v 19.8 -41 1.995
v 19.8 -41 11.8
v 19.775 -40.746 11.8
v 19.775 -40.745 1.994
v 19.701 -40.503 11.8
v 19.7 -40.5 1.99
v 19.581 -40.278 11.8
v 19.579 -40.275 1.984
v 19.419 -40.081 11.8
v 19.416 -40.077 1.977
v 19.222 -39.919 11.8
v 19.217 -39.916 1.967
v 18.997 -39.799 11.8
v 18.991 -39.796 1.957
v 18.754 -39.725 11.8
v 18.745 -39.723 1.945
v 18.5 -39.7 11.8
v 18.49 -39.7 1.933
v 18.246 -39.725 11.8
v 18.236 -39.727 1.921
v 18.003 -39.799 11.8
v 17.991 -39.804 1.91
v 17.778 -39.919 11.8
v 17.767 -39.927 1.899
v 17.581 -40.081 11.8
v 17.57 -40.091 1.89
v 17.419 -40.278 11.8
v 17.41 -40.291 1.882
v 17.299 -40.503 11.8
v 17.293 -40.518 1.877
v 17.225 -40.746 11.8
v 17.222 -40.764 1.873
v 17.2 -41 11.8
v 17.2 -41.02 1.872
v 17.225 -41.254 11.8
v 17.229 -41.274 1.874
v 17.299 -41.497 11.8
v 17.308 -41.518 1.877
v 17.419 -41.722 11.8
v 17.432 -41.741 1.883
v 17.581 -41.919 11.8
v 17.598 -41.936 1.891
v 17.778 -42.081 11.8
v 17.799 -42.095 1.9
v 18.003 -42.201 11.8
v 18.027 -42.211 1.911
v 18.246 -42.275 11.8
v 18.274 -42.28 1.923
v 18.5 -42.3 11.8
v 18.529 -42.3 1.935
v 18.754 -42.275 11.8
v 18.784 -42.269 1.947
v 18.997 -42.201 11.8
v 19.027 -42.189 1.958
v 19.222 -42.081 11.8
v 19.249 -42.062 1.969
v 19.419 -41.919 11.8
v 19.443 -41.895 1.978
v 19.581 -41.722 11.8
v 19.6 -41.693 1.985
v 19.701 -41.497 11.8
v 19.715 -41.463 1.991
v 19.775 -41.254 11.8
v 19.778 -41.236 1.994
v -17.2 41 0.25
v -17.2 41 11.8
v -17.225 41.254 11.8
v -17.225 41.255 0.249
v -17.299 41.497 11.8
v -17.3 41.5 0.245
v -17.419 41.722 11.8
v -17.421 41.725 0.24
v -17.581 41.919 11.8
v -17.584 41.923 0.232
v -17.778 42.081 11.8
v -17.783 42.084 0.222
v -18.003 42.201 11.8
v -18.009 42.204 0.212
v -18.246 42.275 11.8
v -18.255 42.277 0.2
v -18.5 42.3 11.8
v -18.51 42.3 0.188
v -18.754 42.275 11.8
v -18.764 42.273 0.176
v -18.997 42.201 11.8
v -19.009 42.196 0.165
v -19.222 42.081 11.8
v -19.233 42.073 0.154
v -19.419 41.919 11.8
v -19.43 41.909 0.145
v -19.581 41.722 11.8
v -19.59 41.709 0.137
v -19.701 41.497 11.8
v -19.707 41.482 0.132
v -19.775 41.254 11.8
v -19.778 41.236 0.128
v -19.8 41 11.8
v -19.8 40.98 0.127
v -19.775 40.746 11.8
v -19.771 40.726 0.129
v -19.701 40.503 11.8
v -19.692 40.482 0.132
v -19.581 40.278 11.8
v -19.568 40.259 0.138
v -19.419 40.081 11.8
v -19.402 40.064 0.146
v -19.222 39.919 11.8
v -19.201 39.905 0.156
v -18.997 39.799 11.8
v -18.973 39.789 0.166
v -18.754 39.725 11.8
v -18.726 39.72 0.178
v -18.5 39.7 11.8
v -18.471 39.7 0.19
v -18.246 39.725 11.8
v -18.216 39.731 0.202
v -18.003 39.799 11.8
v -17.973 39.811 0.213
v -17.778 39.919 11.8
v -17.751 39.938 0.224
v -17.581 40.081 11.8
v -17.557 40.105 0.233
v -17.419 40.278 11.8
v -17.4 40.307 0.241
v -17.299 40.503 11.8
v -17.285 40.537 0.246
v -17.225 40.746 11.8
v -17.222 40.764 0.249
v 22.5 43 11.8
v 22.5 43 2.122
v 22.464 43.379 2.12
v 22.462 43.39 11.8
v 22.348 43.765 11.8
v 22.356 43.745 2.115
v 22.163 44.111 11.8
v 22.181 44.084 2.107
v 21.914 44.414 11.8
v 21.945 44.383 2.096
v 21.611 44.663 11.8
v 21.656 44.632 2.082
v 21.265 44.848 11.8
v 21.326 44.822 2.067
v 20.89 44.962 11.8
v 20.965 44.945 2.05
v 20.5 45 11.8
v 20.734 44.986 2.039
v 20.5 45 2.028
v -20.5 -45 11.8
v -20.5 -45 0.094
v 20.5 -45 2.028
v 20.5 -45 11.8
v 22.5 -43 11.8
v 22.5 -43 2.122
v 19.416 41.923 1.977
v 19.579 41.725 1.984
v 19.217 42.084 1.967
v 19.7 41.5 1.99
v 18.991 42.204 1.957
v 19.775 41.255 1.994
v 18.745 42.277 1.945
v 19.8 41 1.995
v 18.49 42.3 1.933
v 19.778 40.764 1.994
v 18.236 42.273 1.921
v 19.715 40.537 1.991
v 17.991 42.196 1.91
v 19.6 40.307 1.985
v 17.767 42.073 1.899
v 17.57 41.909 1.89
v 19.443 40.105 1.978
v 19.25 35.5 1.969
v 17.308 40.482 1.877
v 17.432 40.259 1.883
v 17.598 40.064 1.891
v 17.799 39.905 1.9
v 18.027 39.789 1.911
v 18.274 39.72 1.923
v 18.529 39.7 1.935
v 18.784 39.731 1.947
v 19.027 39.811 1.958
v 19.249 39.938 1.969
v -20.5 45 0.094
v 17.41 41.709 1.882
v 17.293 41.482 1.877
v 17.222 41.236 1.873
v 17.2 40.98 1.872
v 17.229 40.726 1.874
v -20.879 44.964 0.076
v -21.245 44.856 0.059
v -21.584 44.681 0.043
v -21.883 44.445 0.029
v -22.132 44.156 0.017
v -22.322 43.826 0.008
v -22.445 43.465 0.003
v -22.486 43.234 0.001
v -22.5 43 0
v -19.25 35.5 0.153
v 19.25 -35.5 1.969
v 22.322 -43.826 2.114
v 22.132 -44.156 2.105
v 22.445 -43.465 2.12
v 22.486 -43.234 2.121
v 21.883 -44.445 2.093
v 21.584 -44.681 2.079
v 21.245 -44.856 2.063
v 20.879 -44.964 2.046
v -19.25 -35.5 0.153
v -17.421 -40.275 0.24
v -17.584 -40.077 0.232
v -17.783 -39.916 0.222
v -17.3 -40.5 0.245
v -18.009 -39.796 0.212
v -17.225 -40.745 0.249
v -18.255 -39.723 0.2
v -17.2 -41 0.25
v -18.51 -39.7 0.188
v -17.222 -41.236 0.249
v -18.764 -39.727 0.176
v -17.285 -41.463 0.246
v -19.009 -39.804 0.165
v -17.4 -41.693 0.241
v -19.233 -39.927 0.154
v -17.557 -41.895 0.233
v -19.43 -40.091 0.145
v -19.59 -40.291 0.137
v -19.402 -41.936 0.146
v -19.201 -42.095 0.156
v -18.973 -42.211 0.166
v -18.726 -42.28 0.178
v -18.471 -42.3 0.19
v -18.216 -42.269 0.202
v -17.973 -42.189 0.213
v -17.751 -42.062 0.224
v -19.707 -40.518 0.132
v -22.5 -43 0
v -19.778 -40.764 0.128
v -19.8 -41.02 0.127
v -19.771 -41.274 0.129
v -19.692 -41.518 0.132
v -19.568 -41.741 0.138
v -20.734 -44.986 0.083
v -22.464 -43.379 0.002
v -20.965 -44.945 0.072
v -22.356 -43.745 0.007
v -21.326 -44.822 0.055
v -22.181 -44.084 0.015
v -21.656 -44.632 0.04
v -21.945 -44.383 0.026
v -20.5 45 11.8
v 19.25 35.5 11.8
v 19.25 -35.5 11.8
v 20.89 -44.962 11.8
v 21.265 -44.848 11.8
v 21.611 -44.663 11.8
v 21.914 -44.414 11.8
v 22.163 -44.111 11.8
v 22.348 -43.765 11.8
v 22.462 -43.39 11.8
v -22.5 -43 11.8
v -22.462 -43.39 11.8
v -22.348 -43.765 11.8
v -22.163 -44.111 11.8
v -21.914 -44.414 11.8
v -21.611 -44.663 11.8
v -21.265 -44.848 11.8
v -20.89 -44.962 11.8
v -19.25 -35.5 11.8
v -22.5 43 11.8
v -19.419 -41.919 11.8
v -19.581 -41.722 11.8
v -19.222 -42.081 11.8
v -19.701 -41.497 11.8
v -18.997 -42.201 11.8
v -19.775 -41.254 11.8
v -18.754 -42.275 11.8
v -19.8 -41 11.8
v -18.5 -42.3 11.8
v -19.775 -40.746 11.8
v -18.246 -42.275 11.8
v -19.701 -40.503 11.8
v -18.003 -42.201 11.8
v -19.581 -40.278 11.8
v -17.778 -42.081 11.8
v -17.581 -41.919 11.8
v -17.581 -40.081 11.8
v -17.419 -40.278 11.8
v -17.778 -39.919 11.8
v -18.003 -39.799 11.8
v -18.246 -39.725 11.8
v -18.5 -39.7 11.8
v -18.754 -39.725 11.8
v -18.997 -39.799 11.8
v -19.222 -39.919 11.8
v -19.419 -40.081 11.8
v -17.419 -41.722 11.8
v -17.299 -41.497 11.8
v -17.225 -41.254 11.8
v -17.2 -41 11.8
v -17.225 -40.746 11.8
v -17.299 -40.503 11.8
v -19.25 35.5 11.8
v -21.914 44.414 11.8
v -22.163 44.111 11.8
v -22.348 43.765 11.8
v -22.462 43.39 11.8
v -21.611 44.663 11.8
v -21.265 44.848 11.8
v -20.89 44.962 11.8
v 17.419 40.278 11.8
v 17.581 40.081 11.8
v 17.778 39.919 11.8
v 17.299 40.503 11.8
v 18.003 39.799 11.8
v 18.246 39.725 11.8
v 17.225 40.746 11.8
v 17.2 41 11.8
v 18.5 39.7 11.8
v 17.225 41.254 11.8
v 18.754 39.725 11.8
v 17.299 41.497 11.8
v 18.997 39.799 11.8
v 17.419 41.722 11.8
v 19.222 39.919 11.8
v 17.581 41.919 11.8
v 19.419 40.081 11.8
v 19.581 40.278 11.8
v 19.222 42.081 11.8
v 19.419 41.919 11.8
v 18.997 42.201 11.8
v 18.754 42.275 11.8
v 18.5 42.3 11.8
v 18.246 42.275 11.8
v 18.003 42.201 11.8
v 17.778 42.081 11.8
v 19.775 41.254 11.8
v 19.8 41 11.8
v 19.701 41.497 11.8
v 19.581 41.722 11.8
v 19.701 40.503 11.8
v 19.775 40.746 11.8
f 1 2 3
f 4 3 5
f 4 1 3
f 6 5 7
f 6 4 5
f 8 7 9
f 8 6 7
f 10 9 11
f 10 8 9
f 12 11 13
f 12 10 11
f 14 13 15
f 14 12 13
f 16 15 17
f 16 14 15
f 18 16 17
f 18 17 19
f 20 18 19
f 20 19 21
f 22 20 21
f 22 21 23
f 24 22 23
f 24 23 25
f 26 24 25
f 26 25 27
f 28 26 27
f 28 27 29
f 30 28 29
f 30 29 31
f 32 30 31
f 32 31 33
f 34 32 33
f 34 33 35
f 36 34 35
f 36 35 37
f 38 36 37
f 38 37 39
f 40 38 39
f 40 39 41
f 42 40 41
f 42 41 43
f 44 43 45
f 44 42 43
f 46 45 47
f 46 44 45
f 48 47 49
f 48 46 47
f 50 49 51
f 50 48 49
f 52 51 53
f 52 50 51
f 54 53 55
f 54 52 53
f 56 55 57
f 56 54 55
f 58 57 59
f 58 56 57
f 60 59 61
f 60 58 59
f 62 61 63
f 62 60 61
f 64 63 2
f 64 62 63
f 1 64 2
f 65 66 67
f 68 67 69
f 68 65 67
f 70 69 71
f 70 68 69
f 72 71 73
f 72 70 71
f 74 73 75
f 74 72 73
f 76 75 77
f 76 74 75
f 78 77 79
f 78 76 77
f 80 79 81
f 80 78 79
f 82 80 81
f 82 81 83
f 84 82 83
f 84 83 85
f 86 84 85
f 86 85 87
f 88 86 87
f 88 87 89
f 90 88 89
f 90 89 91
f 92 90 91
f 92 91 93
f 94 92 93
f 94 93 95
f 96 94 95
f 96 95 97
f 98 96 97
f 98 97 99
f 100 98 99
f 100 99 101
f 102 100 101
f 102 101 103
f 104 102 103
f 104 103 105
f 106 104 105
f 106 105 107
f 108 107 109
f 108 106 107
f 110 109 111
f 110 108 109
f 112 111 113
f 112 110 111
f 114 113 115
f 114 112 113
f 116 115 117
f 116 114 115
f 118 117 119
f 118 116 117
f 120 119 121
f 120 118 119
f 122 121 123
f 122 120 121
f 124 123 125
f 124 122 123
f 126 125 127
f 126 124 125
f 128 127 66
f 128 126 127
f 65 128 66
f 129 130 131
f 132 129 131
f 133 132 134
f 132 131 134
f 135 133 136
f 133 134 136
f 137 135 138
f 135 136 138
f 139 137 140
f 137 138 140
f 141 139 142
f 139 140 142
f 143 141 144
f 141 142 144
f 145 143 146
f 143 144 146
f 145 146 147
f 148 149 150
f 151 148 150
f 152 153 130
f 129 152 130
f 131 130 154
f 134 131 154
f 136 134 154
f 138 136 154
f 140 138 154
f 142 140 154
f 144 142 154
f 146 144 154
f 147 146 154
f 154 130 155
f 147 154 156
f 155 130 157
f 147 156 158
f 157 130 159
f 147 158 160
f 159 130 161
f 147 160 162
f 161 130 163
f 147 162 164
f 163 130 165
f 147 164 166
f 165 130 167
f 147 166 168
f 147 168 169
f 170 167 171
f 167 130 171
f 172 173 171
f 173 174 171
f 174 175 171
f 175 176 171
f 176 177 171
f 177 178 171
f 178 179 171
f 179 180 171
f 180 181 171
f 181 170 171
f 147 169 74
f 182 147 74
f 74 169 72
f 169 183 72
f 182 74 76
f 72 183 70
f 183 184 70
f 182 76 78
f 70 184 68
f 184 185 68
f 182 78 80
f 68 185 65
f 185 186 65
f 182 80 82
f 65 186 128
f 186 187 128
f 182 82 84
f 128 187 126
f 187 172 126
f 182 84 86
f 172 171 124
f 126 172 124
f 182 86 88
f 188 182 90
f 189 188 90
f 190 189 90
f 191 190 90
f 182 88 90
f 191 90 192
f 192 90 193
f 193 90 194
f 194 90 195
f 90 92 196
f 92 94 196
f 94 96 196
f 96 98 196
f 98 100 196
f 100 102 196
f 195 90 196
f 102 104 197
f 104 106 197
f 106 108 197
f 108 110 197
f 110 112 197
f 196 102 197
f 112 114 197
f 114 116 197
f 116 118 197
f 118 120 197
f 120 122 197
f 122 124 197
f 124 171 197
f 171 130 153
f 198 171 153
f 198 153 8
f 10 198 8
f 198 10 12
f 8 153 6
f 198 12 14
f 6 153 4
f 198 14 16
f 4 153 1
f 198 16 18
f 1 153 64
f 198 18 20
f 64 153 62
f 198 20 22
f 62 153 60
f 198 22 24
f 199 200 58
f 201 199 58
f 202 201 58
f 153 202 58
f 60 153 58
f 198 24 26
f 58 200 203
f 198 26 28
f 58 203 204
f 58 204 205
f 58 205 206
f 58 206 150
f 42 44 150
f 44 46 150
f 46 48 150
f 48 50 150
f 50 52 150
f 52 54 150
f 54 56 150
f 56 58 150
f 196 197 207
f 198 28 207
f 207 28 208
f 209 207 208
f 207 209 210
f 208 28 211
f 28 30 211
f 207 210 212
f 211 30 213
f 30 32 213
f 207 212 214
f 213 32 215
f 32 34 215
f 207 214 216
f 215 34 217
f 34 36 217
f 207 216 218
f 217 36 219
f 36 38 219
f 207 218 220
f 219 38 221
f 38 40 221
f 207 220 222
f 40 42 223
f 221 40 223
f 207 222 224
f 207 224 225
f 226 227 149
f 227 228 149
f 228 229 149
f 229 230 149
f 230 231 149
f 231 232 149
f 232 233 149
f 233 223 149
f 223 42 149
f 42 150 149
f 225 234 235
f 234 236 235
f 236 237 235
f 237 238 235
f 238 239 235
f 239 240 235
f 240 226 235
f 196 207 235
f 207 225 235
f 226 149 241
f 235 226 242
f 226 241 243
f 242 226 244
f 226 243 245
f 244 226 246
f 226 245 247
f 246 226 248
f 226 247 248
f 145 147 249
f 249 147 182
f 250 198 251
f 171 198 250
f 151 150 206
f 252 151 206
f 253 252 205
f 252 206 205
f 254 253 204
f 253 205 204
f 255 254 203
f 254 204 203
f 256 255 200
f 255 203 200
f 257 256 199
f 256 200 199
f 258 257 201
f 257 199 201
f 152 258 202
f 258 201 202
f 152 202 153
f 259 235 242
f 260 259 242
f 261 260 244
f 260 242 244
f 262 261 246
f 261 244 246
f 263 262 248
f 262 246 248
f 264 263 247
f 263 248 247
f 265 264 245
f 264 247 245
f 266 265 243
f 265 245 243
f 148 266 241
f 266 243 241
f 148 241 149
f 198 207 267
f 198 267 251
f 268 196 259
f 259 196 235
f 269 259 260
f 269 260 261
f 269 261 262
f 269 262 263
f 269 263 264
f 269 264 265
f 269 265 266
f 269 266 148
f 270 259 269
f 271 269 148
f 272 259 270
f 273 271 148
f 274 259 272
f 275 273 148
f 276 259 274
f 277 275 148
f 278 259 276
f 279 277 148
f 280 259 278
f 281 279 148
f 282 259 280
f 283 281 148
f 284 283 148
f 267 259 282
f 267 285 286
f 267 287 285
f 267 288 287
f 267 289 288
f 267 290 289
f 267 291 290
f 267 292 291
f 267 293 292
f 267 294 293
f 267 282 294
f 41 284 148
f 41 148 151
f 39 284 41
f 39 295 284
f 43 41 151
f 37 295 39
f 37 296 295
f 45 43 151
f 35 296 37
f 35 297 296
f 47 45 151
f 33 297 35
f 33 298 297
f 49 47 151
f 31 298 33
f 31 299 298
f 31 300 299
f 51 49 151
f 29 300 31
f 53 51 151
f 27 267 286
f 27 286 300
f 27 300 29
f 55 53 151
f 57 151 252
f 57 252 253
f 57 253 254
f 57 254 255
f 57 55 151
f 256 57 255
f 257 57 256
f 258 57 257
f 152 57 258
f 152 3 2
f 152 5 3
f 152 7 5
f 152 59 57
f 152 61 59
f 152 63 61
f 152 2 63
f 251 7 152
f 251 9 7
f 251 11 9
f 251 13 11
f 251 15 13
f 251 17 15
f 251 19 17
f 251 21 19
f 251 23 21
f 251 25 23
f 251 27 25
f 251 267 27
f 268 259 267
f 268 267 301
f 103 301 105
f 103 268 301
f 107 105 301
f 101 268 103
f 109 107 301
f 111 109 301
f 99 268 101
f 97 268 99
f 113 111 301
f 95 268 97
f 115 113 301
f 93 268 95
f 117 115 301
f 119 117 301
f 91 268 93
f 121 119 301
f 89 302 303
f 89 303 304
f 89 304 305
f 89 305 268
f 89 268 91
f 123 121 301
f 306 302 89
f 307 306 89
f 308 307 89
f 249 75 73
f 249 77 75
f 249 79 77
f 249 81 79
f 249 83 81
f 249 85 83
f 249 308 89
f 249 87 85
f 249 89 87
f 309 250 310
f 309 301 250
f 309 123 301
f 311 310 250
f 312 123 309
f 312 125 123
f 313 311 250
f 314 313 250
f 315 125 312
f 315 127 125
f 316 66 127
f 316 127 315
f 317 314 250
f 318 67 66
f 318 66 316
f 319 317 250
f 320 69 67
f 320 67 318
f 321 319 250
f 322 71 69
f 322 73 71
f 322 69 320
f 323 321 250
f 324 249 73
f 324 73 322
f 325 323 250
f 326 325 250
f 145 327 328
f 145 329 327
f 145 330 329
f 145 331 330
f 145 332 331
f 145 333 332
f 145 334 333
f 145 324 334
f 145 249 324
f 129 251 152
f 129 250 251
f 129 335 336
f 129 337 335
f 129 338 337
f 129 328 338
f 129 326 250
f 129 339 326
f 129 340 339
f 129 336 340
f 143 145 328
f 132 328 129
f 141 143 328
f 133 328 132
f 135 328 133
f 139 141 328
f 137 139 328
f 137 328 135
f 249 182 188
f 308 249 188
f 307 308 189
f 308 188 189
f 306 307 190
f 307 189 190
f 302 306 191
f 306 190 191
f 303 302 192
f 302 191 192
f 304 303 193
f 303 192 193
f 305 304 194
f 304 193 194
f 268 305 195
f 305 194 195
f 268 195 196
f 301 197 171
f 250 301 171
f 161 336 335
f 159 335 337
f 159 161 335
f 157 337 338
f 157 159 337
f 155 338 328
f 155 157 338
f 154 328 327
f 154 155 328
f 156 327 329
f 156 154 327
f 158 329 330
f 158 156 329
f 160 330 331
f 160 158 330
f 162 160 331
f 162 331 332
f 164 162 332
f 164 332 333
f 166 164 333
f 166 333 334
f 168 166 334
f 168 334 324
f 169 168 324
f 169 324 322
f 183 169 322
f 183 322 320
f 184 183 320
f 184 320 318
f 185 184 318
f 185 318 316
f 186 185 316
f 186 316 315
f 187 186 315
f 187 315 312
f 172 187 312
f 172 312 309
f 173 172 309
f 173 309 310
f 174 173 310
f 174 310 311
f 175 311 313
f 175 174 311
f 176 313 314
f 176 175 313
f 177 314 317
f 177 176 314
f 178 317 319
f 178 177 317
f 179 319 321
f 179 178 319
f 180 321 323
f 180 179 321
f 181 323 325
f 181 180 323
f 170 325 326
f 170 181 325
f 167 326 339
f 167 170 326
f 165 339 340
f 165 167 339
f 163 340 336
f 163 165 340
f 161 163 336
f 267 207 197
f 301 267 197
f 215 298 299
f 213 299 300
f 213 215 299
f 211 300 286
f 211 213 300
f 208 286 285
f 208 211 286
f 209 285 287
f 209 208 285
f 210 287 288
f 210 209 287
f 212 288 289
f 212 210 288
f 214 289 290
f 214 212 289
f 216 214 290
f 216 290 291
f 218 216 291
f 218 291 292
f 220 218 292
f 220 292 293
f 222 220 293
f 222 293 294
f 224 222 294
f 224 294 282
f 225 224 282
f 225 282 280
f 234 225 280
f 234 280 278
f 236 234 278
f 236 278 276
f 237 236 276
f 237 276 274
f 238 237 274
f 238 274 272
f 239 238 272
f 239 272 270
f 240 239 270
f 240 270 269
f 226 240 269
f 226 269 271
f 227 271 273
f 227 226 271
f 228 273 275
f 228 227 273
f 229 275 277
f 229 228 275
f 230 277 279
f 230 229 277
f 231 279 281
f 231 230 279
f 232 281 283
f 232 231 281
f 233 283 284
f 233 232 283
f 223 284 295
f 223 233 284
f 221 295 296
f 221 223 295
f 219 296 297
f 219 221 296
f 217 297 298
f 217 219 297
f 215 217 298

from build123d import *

# Parameters (mm, degrees)
F0_R     = 1.3
F0_W     = 38.5
F0_H     = 71
F1_DEPTH = 11.8
F3_DEPTH = 200


with BuildPart() as f1:
    # F0 (on Top) → F1 (new body)
    with BuildSketch(Plane.XY):
        with BuildLine():
            Line((20.5, 45), (-20.5, 45))
            ThreePointArc((-20.5, 45), (-21.914214, 44.414214), (-22.5, 43))
            Line((-22.5, 43), (-22.5, -43))
            ThreePointArc((-22.5, -43), (-21.914214, -44.414214), (-20.5, -45))
            Line((-20.5, -45), (20.5, -45))
            ThreePointArc((20.5, -45), (21.914214, -44.414214), (22.5, -43))
            Line((22.5, -43), (22.5, 43))
            ThreePointArc((22.5, 43), (21.914214, 44.414214), (20.5, 45))
        make_face()
        with Locations((-18.5, -41)):
            Circle(F0_R, mode=Mode.SUBTRACT)
        with Locations((18.5, -41)):
            Circle(F0_R, mode=Mode.SUBTRACT)
        with Locations((-18.5, 41)):
            Circle(F0_R, mode=Mode.SUBTRACT)
        Rectangle(F0_W, F0_H, mode=Mode.SUBTRACT)
        with Locations((18.5, 41)):
            Circle(F0_R, mode=Mode.SUBTRACT)
    extrude(amount=F1_DEPTH)

    # F2 (on Front) → F3 (cut, symmetric)
    with BuildSketch(Plane.XZ):
        Polygon((22.5, 2.122146), (-22.5, 0), (22.5, 0), align=None)
    extrude(amount=F3_DEPTH, both=True, mode=Mode.SUBTRACT)


solid = f1.part
